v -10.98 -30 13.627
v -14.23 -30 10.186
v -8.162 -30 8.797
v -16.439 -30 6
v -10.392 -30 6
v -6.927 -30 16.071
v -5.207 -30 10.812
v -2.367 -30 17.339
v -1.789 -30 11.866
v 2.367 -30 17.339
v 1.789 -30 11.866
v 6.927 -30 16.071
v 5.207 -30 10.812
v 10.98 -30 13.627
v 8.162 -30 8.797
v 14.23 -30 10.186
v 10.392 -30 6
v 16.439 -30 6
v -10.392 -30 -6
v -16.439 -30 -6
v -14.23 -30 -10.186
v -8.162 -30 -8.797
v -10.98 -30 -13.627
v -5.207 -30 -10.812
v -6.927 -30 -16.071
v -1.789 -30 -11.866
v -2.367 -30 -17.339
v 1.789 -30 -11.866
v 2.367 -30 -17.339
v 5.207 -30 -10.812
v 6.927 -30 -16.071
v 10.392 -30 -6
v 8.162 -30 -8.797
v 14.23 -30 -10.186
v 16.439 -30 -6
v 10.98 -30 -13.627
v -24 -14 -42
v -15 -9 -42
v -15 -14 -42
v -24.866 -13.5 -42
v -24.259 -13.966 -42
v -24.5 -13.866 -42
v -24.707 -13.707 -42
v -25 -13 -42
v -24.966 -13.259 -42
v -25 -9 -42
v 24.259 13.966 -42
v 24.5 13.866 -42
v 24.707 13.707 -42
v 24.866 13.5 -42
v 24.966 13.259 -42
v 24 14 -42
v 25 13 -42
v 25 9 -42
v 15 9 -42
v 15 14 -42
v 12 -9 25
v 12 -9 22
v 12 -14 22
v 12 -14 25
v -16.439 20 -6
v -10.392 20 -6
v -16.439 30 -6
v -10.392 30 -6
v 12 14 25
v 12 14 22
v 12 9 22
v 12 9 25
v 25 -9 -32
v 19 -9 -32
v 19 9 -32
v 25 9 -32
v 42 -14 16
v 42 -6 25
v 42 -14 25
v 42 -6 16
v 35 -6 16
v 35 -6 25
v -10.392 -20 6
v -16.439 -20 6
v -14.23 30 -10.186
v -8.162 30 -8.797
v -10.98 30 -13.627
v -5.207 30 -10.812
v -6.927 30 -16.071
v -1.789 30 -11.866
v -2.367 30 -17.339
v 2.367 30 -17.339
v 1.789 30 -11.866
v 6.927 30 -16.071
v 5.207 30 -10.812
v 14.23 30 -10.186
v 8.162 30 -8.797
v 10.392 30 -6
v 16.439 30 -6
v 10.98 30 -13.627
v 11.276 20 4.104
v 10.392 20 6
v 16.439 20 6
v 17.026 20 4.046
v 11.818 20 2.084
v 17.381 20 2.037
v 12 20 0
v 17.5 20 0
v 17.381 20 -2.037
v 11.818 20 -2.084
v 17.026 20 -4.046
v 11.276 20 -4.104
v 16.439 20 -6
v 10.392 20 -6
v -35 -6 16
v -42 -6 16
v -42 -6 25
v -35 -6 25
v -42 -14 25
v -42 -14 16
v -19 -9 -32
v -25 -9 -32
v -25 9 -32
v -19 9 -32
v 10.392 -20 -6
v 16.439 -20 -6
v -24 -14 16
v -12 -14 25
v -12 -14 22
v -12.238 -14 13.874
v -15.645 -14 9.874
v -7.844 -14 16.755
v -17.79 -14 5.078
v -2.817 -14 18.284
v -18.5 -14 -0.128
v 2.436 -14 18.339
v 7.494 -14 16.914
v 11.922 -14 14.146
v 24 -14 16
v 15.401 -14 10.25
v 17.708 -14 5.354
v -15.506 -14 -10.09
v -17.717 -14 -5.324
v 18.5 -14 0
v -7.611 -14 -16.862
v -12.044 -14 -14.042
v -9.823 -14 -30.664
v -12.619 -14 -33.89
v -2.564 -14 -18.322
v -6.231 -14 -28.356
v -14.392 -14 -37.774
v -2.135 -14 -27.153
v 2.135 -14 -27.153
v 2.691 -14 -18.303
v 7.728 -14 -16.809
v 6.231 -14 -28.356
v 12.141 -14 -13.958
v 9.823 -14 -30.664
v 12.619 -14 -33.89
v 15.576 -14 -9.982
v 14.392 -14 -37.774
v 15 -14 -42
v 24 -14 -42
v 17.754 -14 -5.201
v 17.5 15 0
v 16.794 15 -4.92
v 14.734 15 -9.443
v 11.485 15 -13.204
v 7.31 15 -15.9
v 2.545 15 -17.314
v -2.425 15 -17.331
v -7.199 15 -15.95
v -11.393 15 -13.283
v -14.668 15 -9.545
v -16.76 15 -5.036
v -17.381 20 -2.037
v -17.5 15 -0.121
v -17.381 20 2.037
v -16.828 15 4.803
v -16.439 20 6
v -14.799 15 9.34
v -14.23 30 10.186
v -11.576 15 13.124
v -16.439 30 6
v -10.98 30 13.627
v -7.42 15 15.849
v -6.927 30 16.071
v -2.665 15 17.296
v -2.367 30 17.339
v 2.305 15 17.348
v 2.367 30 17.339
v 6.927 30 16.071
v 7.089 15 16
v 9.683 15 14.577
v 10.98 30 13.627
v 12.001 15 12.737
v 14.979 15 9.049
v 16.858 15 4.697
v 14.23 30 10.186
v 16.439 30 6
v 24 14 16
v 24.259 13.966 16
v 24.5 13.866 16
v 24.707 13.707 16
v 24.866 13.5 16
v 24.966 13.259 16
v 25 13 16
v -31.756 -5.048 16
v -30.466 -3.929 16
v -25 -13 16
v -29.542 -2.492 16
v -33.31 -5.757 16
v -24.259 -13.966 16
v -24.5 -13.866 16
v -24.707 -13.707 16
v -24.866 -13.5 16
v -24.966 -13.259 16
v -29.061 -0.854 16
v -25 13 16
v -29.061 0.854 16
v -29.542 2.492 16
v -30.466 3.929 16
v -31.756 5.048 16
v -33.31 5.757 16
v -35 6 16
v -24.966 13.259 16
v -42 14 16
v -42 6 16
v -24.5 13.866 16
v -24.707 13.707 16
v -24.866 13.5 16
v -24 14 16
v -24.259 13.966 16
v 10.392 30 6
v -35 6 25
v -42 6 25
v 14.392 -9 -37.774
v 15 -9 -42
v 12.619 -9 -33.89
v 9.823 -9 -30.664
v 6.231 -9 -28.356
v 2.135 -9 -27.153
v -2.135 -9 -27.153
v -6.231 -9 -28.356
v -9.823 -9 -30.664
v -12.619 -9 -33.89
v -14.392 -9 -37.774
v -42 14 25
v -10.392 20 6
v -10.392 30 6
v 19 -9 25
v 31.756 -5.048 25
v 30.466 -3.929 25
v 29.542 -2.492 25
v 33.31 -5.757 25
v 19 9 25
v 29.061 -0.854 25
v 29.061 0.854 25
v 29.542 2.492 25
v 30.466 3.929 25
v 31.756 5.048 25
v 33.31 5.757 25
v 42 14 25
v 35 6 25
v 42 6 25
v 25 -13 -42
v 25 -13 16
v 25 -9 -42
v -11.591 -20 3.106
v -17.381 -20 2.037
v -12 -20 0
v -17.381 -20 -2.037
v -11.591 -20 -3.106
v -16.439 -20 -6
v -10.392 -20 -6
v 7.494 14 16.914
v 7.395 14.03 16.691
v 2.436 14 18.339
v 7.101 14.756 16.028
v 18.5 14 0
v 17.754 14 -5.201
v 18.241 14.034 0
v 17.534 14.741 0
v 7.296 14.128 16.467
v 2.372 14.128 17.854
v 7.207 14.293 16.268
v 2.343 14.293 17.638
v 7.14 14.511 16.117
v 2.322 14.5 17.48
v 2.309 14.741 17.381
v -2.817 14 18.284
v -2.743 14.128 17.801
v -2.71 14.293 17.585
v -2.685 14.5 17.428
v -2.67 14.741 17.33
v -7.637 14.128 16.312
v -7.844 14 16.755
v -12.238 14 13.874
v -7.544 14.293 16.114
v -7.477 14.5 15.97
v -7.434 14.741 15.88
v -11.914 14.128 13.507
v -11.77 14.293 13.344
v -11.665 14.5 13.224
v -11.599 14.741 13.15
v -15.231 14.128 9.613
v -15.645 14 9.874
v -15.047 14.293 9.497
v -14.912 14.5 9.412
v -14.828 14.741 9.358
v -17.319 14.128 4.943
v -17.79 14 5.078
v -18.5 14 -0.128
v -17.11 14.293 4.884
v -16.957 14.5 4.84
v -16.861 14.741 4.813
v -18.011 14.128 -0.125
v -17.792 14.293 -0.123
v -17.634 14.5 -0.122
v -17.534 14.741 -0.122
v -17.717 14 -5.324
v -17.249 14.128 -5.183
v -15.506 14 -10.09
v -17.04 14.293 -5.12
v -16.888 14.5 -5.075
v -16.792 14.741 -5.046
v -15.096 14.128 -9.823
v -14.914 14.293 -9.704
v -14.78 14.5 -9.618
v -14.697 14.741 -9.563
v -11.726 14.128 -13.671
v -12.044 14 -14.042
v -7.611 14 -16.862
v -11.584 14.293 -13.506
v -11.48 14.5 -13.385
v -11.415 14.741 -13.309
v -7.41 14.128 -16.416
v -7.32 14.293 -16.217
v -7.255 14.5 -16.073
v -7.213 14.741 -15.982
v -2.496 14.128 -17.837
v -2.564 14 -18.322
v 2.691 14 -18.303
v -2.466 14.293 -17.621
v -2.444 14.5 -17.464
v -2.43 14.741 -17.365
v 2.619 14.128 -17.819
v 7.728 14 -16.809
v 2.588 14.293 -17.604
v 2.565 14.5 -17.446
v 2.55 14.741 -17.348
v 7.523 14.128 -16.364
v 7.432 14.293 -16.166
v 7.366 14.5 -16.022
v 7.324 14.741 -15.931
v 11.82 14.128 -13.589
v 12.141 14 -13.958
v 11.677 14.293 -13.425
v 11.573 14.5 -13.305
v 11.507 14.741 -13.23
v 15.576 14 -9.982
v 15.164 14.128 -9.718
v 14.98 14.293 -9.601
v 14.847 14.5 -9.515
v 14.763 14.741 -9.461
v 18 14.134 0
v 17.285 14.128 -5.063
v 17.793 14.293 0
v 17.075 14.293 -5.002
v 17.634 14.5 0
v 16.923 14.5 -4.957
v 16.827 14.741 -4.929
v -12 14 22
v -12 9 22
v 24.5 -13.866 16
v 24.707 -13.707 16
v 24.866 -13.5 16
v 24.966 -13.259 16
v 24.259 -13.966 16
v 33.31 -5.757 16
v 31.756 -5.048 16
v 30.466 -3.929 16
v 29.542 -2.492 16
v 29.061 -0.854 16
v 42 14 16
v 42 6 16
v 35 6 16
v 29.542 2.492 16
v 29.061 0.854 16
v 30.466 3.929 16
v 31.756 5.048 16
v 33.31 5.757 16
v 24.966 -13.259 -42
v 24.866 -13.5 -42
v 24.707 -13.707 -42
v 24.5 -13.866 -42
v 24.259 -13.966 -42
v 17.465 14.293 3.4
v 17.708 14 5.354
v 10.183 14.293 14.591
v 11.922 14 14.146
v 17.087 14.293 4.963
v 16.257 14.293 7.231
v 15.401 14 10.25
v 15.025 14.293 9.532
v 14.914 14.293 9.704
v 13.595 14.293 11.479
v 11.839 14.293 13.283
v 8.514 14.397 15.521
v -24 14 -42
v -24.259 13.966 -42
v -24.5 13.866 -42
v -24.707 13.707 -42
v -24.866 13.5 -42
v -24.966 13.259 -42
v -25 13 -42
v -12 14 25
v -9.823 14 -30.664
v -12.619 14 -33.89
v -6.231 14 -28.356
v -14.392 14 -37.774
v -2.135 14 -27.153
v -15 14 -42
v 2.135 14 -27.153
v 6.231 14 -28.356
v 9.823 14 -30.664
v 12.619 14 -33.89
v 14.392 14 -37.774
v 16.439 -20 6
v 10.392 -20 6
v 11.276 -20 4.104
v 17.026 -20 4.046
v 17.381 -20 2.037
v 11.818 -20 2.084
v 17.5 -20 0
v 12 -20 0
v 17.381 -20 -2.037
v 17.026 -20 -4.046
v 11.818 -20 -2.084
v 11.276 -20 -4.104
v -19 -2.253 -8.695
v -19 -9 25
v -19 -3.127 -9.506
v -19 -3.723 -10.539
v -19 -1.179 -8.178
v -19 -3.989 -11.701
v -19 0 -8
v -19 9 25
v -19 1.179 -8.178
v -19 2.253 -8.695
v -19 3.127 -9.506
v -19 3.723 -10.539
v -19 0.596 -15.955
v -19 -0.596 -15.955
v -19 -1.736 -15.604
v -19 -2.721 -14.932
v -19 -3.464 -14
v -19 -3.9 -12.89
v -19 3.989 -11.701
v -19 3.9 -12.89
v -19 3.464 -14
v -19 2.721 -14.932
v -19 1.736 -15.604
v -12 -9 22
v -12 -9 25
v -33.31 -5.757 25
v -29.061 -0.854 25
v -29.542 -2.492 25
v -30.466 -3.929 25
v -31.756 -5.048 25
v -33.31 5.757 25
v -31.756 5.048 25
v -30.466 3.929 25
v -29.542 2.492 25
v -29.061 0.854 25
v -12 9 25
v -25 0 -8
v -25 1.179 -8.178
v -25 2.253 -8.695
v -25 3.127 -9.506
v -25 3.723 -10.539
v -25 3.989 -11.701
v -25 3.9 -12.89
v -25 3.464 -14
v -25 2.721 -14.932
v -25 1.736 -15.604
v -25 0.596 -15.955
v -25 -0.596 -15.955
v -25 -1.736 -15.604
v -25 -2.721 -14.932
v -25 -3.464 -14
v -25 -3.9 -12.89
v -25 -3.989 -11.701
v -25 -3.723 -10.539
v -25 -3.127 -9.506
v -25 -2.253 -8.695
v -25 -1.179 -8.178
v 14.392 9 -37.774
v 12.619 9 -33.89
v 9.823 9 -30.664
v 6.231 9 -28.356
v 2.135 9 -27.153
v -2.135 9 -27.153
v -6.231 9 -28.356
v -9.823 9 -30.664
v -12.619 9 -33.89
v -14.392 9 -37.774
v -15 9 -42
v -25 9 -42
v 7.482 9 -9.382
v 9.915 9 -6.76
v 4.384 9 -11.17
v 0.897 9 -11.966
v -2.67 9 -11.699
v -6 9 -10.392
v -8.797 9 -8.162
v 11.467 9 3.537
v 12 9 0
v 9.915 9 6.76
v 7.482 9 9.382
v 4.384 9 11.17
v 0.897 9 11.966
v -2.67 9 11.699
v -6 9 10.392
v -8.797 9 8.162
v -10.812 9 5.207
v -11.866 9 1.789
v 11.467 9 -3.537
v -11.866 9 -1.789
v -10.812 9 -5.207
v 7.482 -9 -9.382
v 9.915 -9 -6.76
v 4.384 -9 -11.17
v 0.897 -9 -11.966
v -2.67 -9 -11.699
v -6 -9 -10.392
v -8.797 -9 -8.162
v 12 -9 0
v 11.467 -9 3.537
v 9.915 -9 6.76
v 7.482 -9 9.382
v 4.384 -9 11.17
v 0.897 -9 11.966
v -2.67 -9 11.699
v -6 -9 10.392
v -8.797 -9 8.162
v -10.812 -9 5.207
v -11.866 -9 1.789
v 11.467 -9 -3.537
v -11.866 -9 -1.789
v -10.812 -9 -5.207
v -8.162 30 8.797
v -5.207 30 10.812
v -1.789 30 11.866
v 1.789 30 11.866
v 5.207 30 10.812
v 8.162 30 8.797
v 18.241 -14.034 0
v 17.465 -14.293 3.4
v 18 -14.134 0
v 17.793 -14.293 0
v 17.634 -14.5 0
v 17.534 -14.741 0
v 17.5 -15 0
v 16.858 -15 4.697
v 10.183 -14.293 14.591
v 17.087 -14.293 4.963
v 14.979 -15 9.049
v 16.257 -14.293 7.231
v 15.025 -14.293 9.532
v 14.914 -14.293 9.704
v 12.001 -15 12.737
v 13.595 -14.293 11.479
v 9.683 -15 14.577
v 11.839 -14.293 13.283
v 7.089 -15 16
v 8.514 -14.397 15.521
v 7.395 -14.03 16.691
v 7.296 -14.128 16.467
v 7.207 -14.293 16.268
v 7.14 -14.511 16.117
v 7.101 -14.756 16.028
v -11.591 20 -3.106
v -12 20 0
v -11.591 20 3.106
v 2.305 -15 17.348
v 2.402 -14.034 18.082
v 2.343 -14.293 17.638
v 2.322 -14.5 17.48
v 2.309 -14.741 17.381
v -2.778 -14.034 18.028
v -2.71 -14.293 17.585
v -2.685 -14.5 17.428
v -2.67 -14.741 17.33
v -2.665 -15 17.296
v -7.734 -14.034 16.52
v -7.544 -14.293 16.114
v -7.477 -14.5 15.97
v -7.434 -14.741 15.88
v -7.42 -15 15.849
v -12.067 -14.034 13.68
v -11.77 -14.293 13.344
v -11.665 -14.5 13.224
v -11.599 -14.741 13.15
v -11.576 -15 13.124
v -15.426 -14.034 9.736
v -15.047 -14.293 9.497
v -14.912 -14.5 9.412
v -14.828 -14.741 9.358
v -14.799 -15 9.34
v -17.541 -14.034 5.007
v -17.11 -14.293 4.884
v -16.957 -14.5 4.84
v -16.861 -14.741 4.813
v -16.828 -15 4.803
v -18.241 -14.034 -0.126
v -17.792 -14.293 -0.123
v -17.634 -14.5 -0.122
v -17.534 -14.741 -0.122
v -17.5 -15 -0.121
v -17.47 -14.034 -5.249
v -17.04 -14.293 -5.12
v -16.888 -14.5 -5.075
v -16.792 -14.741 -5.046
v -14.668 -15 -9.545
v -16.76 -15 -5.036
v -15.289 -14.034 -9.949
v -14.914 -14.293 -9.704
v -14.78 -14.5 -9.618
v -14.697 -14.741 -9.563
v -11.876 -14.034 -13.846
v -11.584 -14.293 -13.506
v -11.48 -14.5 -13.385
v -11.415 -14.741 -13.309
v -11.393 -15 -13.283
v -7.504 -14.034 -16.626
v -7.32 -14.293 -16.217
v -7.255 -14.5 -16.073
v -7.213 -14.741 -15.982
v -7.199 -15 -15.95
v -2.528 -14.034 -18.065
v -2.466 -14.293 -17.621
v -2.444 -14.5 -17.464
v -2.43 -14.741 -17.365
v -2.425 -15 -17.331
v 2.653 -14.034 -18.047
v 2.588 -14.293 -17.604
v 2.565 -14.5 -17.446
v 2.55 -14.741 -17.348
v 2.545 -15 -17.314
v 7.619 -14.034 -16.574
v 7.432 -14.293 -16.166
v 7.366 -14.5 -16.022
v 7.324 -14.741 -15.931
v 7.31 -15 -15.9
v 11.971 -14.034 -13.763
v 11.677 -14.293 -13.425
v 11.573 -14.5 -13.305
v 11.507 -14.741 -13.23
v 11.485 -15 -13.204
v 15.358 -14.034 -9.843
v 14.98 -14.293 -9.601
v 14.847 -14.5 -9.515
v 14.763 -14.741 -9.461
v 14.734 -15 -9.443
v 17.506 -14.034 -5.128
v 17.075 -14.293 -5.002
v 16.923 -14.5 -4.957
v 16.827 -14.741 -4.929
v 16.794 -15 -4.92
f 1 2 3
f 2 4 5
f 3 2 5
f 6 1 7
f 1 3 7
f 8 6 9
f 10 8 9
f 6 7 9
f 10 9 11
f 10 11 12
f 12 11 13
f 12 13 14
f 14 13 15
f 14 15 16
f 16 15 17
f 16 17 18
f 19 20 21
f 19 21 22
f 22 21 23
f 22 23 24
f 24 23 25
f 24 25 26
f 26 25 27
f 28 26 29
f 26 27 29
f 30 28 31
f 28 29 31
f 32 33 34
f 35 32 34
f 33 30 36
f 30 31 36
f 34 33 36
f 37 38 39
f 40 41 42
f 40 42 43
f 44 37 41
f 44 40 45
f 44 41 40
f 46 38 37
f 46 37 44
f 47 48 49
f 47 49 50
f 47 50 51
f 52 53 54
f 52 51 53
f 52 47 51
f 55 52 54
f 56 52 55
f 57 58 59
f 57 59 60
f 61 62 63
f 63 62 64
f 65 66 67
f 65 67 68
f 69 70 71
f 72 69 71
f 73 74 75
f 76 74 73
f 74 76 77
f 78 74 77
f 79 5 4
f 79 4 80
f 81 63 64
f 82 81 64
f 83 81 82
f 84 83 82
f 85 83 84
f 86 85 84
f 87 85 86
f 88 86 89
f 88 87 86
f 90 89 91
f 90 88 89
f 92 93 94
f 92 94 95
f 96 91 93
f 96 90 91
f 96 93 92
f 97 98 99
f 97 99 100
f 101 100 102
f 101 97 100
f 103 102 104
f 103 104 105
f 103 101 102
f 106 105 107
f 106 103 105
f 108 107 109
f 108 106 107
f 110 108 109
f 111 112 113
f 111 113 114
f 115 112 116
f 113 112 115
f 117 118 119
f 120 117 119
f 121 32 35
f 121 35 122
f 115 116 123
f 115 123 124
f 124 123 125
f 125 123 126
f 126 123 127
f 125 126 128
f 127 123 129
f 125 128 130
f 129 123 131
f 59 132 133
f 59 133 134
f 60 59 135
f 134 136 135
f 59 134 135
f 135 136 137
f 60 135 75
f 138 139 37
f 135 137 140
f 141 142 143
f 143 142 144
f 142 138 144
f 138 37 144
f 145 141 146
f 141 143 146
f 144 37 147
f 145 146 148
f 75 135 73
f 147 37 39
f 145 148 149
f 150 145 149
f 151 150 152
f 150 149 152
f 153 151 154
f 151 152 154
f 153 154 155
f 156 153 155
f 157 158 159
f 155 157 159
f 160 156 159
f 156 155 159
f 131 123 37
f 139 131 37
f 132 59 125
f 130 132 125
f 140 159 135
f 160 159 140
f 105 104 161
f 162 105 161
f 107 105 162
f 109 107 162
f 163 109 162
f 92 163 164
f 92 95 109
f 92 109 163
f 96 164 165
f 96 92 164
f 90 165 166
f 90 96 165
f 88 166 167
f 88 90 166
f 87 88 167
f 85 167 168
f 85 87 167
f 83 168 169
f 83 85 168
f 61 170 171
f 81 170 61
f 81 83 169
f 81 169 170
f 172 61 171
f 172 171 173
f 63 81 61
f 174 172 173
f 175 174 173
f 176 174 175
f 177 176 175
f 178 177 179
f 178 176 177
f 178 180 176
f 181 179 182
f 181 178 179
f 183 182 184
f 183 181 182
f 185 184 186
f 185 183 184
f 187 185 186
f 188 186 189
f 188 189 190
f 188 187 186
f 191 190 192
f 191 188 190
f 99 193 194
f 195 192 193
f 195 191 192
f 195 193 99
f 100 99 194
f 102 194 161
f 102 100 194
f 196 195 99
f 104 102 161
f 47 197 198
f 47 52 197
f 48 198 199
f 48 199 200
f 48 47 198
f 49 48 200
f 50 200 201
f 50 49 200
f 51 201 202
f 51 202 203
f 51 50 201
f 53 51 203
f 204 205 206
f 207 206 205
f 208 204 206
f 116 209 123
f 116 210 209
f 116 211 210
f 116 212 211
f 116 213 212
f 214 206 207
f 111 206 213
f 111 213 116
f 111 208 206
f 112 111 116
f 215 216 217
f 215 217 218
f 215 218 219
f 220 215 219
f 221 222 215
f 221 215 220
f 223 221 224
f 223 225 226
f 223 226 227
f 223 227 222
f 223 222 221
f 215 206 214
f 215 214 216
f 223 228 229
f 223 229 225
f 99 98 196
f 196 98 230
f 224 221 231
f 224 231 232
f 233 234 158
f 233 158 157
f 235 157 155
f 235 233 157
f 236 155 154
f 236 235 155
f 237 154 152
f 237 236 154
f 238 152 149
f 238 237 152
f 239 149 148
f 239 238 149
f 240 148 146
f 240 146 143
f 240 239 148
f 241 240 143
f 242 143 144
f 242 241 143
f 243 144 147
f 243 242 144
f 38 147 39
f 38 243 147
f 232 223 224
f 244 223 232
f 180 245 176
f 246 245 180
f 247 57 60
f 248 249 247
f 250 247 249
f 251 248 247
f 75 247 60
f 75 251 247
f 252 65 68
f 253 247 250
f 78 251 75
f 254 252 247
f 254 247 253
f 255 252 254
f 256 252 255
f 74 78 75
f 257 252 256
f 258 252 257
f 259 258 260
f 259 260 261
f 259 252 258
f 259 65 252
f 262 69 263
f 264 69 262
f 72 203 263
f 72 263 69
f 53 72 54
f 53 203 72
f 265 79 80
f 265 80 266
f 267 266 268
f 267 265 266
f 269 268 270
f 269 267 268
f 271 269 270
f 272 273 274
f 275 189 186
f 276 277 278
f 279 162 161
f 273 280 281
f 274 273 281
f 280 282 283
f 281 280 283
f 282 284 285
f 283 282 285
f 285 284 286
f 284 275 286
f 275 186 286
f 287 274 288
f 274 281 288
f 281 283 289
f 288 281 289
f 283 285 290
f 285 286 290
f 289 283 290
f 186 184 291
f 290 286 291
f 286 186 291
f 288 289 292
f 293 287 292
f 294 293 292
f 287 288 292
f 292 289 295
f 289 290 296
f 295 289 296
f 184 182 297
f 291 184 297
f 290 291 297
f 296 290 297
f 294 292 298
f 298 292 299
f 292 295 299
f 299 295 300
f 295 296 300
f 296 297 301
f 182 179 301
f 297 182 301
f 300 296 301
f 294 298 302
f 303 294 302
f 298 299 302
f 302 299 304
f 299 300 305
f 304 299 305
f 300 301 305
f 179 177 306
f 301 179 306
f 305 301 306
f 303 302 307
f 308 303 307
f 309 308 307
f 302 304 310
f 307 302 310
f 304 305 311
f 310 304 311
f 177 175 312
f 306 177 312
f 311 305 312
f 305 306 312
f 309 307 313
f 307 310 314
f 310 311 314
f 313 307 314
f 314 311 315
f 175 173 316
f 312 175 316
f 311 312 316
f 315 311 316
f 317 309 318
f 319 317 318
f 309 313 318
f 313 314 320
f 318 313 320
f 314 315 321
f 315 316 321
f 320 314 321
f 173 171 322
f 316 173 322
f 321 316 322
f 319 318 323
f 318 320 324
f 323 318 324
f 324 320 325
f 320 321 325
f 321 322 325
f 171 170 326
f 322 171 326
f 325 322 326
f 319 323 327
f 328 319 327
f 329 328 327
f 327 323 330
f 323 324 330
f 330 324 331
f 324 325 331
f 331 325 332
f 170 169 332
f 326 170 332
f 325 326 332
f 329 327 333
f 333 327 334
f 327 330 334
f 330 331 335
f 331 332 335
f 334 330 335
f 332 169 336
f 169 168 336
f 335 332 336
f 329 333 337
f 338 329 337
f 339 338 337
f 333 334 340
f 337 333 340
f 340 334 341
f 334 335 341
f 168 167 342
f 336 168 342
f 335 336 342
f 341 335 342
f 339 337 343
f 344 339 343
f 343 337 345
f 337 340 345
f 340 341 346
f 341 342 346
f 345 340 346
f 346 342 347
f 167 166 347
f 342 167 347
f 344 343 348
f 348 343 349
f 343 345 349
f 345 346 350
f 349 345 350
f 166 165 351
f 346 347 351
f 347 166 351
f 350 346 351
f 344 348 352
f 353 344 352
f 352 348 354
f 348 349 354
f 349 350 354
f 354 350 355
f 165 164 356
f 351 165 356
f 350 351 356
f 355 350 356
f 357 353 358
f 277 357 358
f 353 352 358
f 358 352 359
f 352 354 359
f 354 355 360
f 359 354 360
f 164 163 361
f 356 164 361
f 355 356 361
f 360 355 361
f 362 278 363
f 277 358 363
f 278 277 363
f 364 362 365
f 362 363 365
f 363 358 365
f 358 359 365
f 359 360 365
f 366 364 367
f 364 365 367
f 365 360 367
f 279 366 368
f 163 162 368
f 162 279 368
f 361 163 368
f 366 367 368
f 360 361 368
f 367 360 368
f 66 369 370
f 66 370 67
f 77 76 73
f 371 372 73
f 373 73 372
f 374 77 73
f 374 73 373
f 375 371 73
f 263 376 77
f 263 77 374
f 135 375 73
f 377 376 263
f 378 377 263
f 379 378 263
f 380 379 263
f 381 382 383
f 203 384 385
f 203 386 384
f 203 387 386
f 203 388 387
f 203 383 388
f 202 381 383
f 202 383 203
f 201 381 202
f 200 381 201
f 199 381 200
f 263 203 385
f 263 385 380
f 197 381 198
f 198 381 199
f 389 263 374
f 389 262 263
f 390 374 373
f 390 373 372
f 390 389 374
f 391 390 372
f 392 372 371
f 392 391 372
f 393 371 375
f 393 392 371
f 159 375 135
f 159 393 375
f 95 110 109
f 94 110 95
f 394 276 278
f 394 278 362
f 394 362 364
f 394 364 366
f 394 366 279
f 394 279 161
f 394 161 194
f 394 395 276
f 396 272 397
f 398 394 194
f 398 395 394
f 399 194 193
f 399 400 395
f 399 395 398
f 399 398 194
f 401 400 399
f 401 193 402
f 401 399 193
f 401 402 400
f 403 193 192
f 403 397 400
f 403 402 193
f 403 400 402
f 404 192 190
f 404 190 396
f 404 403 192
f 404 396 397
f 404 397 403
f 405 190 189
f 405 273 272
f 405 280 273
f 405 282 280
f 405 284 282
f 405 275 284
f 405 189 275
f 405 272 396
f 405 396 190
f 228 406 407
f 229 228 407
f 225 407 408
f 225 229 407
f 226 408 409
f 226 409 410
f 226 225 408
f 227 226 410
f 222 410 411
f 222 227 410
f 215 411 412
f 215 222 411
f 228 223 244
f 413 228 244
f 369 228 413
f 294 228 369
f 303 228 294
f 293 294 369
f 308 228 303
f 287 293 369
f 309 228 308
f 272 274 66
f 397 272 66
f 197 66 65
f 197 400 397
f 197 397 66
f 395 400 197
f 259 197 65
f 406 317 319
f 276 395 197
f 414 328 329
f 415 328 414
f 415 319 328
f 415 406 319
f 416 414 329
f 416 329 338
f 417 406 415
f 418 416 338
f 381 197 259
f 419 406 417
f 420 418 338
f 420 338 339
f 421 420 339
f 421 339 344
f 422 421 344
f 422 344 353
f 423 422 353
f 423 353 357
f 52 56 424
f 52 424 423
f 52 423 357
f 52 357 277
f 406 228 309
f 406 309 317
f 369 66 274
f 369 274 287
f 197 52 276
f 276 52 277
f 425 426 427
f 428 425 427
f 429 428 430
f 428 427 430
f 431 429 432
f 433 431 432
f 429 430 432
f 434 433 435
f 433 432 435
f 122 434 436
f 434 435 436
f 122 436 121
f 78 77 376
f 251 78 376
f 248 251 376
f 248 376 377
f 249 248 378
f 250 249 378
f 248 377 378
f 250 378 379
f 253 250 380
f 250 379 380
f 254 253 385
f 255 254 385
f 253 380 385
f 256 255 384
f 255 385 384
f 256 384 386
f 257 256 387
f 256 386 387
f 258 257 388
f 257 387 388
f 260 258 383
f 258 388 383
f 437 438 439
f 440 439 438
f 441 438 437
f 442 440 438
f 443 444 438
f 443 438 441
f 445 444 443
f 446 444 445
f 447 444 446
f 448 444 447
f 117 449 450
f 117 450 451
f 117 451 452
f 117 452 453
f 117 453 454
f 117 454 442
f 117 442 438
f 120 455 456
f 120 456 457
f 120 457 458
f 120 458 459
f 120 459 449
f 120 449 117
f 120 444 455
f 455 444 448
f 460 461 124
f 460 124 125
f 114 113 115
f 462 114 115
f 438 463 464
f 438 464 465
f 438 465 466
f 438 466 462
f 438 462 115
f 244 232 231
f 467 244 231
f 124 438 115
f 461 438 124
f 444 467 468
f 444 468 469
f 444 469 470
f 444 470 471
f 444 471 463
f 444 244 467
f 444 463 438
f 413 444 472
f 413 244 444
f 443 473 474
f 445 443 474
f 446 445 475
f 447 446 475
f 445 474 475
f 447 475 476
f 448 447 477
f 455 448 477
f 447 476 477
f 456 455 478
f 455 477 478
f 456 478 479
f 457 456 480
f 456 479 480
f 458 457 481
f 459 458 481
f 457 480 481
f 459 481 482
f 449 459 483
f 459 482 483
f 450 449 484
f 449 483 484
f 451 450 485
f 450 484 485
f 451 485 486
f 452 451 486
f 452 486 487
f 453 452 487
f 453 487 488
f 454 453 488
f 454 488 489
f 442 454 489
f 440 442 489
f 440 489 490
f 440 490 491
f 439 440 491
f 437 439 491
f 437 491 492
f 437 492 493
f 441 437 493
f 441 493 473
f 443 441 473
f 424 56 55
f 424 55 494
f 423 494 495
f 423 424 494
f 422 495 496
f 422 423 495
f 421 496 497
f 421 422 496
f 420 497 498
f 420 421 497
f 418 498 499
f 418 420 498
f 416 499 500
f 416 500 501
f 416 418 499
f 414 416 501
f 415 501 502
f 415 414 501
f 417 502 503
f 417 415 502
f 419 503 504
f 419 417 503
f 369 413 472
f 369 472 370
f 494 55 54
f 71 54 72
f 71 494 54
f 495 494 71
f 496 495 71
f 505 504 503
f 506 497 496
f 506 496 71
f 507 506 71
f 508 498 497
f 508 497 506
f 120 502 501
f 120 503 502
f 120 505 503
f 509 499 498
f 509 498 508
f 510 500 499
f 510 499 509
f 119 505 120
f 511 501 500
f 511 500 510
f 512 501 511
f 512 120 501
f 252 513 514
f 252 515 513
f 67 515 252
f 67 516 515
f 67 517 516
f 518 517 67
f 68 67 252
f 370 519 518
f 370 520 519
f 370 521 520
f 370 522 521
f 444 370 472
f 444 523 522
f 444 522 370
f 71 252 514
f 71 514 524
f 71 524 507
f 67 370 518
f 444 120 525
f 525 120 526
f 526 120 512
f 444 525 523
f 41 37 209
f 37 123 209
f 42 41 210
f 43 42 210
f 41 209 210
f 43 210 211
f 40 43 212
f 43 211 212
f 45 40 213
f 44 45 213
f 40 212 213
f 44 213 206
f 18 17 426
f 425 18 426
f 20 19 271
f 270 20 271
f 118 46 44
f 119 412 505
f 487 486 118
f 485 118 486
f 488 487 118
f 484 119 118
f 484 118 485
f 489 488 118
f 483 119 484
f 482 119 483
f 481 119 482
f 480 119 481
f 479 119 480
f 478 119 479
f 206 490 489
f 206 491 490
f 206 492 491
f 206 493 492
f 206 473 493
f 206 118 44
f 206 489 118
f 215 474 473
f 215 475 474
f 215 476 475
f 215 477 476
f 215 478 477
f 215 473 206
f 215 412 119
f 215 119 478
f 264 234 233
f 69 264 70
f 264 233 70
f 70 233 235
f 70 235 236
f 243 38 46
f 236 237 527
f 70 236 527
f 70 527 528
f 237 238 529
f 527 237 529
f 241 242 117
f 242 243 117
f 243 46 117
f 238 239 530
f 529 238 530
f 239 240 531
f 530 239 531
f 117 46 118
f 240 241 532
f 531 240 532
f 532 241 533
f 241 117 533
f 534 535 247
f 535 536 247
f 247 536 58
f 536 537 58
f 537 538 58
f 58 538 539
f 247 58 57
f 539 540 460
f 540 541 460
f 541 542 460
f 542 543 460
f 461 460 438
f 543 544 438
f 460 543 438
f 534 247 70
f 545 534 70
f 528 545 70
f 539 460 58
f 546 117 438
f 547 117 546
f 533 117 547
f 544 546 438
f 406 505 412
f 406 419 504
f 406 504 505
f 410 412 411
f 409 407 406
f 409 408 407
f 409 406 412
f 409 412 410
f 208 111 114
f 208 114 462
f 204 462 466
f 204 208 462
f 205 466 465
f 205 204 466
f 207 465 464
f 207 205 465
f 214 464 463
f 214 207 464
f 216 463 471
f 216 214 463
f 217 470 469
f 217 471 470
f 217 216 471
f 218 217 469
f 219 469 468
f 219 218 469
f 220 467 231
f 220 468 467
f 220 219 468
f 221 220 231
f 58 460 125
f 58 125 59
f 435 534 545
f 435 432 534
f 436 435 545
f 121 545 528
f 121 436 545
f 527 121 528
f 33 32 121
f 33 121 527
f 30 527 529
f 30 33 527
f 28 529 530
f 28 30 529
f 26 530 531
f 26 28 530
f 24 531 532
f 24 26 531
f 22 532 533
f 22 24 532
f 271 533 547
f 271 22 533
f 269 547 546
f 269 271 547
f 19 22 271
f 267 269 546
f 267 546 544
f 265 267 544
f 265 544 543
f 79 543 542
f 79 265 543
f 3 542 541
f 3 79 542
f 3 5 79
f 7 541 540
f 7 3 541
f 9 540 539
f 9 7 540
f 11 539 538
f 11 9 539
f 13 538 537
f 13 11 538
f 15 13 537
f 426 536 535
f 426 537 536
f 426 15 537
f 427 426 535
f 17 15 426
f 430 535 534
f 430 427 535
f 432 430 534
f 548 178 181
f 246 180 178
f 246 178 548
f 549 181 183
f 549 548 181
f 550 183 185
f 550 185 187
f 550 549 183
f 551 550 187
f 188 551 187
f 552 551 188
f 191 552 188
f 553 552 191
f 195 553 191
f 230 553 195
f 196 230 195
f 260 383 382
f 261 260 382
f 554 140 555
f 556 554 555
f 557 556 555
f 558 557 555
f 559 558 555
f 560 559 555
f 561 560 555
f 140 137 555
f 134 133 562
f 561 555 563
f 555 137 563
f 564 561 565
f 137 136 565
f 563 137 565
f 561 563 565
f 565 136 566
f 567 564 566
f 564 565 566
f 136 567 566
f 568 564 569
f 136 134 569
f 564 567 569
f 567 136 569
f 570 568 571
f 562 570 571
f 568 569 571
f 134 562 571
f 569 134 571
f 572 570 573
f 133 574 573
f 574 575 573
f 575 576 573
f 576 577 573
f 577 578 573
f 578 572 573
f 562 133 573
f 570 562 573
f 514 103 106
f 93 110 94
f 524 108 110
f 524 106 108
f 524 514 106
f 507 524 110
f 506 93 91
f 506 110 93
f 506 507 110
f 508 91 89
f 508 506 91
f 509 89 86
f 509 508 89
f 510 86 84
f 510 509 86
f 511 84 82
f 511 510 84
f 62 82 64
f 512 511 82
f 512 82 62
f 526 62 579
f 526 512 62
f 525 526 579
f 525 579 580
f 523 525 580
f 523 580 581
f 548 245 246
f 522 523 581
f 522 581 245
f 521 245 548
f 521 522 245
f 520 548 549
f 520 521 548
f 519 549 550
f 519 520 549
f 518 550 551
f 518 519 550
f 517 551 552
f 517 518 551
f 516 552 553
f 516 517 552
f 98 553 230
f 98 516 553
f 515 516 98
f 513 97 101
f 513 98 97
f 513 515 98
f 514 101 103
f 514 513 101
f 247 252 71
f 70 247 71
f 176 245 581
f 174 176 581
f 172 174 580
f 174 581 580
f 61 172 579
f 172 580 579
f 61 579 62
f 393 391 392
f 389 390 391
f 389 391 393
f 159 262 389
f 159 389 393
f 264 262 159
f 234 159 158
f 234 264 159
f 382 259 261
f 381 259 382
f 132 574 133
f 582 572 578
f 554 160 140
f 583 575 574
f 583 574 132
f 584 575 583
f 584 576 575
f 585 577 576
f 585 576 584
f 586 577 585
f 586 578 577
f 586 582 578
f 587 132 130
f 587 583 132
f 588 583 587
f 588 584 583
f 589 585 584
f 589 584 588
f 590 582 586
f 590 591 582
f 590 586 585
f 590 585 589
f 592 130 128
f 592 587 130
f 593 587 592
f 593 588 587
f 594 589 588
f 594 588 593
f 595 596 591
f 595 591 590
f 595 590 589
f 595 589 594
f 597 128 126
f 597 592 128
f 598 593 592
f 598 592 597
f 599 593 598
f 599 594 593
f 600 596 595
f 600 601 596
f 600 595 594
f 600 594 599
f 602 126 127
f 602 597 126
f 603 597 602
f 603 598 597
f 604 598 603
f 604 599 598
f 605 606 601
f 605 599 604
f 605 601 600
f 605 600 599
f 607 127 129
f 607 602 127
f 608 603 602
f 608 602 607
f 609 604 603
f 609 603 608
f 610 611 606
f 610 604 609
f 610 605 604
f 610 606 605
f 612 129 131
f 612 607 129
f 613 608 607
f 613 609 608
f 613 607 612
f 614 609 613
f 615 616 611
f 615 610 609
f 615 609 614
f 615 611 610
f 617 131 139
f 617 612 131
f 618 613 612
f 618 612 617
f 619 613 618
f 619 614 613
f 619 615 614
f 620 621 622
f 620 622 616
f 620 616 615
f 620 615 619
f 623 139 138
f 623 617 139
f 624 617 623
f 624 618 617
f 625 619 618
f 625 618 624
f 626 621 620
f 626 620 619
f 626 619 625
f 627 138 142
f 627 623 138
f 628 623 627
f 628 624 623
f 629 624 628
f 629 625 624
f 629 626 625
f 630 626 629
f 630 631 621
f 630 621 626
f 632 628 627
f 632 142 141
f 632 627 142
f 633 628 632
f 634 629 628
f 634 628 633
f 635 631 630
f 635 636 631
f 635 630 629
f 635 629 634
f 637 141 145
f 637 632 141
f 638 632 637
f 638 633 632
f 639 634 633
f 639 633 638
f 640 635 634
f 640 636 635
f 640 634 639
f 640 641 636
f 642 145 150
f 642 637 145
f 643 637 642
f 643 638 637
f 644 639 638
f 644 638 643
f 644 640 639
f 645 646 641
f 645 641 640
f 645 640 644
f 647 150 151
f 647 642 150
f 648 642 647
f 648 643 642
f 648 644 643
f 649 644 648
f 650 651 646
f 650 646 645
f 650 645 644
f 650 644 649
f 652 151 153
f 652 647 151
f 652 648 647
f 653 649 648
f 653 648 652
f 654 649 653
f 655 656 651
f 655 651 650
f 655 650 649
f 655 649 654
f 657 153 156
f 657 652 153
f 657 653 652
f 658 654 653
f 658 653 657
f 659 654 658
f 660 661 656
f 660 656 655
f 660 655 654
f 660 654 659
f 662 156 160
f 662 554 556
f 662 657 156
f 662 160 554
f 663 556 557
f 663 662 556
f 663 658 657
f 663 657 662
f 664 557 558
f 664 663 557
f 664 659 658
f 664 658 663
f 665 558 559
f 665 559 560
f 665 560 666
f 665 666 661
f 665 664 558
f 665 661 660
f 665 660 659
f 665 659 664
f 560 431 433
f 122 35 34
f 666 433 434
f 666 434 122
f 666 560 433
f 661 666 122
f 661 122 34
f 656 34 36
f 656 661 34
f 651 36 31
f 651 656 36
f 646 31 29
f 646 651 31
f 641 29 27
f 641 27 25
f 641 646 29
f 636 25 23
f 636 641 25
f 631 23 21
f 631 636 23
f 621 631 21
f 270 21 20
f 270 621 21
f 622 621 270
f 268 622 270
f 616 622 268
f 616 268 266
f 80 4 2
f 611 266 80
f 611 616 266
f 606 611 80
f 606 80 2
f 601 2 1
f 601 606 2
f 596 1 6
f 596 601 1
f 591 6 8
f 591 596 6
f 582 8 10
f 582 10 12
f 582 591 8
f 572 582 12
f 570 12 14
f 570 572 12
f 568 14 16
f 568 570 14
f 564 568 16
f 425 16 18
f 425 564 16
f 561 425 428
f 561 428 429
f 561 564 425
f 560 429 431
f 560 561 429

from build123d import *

# Parameters (mm, degrees)
SKETCH1_R               = 17.5
SKETCH1_R_2             = 12
BOSS_EXTRUDE1_DEPTH     = 30
BOSS_EXTRUDE2_DEPTH     = 14
CUT_EXTRUDE1_DEPTH      = 10
SKETCH8_W               = 84
SKETCH8_H               = 18
CUT_EXTRUDE2_DEPTH      = 19
SKETCH9_W               = 10
SKETCH9_H               = 18
CUT_EXTRUDE3_DEPTH      = 68
SKETCH10_W              = 12
SKETCH10_H              = 10
CUT_EXTRUDE4_DEPTH      = 43
CUT_EXTRUDE4_DEPTH_BACK = 43
CUT_EXTRUDE5_REACH      = 69
SKETCH7_R               = 4
FILLET2_R               = 1


with BuildPart() as part:
    # Sketch1 → Boss-Extrude1 (new body, symmetric)
    with BuildSketch(Plane(origin=(0, 0, 0), x_dir=(1, 0, 0), z_dir=(0, 1, 0))):
        Circle(SKETCH1_R)
        Circle(SKETCH1_R_2, mode=Mode.SUBTRACT)
    extrude(amount=BOSS_EXTRUDE1_DEPTH, both=True)

    # Sketch5 → Boss-Extrude2 (add, symmetric)
    with BuildSketch(Plane(origin=(0, 0, 0), x_dir=(1, 0, 0), z_dir=(0, 1, 0))):
        Polygon((42, -16), (-42, -16), (-42, -25), (-12, -25), (-12, -22), (12, -22), (12, -25), (42, -25), align=None)
        with BuildLine():
            Line((-25, 42), (-25, -16))
            Line((-25, -16), (-7.088723439, -16))
            ThreePointArc((-7.088723439, -16), (0, 17.5), (7.088723439, -16))
            Line((7.088723439, -16), (25, -16))
            Line((25, -16), (25, 42))
            Line((25, 42), (15, 42))
            ThreePointArc((15, 42), (0, 27), (-15, 42))
            Line((-15, 42), (-25, 42))
        make_face()
    extrude(amount=BOSS_EXTRUDE2_DEPTH, both=True)

    # Sketch6 → Cut-Extrude1 (cut, through all)
    with BuildSketch(Plane(origin=(0, 0, 16), x_dir=(-1, 0, 0), z_dir=(0, 0, -1))):
        with BuildLine():
            Line((35, 6), (49, 6))
            ThreePointArc((49, 6), (55, 0), (49, -6))
            Line((49, -6), (35, -6))
            ThreePointArc((35, -6), (29, 0), (35, 6))
        make_face()
        with BuildLine():
            Line((-35, 6), (-49, 6))
            ThreePointArc((-49, 6), (-55, 0), (-49, -6))
            Line((-49, -6), (-35, -6))
            ThreePointArc((-35, -6), (-29, 0), (-35, 6))
        make_face()
    extrude(amount=-CUT_EXTRUDE1_DEPTH, mode=Mode.SUBTRACT)

    # Sketch8 → Cut-Extrude2 (cut, symmetric)
    with BuildSketch(Plane(origin=(0, 0, 0), x_dir=(0, 0, -1), z_dir=(1, 0, 0))):
        Rectangle(SKETCH8_W, SKETCH8_H)
    extrude(amount=CUT_EXTRUDE2_DEPTH, both=True, mode=Mode.SUBTRACT)

    # Sketch9 → Cut-Extrude3 (cut, through all)
    with BuildSketch(Plane.ZY.offset(25)):
        with Locations((-37, 0)):
            Rectangle(SKETCH9_W, SKETCH9_H)
    extrude(amount=-CUT_EXTRUDE3_DEPTH, mode=Mode.SUBTRACT)

    # Sketch10 → Cut-Extrude4 (cut, two sides)
    with BuildSketch(Plane(origin=(0, 0, 0), x_dir=(0, 0, -1), z_dir=(1, 0, 0))) as cut_extrude4_sk:
        with Locations((0, -25)):
            Rectangle(SKETCH10_W, SKETCH10_H)
        with Locations((0, 25)):
            Rectangle(SKETCH10_W, SKETCH10_H)
    extrude(amount=CUT_EXTRUDE4_DEPTH, mode=Mode.SUBTRACT)
    extrude(cut_extrude4_sk.sketch, amount=-CUT_EXTRUDE4_DEPTH_BACK, mode=Mode.SUBTRACT)

    # Sketch7 → Cut-Extrude5 (cut, up to next)
    with BuildSketch(Plane.ZY.offset(25), mode=Mode.PRIVATE) as cut_extrude5_sk1:
        with Locations((-12, 0)):
            Circle(SKETCH7_R)
    cut_extrude5_tool1 = extrude(cut_extrude5_sk1.sketch, amount=-CUT_EXTRUDE5_REACH, mode=Mode.PRIVATE) & part.part
    add(cut_extrude5_tool1.solids().sort_by_distance((-25, 0, -12))[0], mode=Mode.SUBTRACT)

    # Fillet2
    fillet2_edges = [part.edges().sort_by_distance(p)[0] for p in [
        (-17.5, -14, 0),
        (-17.5, 14, 0),
        (25, 14, -13),
        (-25, 14, -13),
        (-25, -14, -13),
        (25, -14, -13),
    ]]
    fillet(fillet2_edges, radius=FILLET2_R)


solid = part.part
